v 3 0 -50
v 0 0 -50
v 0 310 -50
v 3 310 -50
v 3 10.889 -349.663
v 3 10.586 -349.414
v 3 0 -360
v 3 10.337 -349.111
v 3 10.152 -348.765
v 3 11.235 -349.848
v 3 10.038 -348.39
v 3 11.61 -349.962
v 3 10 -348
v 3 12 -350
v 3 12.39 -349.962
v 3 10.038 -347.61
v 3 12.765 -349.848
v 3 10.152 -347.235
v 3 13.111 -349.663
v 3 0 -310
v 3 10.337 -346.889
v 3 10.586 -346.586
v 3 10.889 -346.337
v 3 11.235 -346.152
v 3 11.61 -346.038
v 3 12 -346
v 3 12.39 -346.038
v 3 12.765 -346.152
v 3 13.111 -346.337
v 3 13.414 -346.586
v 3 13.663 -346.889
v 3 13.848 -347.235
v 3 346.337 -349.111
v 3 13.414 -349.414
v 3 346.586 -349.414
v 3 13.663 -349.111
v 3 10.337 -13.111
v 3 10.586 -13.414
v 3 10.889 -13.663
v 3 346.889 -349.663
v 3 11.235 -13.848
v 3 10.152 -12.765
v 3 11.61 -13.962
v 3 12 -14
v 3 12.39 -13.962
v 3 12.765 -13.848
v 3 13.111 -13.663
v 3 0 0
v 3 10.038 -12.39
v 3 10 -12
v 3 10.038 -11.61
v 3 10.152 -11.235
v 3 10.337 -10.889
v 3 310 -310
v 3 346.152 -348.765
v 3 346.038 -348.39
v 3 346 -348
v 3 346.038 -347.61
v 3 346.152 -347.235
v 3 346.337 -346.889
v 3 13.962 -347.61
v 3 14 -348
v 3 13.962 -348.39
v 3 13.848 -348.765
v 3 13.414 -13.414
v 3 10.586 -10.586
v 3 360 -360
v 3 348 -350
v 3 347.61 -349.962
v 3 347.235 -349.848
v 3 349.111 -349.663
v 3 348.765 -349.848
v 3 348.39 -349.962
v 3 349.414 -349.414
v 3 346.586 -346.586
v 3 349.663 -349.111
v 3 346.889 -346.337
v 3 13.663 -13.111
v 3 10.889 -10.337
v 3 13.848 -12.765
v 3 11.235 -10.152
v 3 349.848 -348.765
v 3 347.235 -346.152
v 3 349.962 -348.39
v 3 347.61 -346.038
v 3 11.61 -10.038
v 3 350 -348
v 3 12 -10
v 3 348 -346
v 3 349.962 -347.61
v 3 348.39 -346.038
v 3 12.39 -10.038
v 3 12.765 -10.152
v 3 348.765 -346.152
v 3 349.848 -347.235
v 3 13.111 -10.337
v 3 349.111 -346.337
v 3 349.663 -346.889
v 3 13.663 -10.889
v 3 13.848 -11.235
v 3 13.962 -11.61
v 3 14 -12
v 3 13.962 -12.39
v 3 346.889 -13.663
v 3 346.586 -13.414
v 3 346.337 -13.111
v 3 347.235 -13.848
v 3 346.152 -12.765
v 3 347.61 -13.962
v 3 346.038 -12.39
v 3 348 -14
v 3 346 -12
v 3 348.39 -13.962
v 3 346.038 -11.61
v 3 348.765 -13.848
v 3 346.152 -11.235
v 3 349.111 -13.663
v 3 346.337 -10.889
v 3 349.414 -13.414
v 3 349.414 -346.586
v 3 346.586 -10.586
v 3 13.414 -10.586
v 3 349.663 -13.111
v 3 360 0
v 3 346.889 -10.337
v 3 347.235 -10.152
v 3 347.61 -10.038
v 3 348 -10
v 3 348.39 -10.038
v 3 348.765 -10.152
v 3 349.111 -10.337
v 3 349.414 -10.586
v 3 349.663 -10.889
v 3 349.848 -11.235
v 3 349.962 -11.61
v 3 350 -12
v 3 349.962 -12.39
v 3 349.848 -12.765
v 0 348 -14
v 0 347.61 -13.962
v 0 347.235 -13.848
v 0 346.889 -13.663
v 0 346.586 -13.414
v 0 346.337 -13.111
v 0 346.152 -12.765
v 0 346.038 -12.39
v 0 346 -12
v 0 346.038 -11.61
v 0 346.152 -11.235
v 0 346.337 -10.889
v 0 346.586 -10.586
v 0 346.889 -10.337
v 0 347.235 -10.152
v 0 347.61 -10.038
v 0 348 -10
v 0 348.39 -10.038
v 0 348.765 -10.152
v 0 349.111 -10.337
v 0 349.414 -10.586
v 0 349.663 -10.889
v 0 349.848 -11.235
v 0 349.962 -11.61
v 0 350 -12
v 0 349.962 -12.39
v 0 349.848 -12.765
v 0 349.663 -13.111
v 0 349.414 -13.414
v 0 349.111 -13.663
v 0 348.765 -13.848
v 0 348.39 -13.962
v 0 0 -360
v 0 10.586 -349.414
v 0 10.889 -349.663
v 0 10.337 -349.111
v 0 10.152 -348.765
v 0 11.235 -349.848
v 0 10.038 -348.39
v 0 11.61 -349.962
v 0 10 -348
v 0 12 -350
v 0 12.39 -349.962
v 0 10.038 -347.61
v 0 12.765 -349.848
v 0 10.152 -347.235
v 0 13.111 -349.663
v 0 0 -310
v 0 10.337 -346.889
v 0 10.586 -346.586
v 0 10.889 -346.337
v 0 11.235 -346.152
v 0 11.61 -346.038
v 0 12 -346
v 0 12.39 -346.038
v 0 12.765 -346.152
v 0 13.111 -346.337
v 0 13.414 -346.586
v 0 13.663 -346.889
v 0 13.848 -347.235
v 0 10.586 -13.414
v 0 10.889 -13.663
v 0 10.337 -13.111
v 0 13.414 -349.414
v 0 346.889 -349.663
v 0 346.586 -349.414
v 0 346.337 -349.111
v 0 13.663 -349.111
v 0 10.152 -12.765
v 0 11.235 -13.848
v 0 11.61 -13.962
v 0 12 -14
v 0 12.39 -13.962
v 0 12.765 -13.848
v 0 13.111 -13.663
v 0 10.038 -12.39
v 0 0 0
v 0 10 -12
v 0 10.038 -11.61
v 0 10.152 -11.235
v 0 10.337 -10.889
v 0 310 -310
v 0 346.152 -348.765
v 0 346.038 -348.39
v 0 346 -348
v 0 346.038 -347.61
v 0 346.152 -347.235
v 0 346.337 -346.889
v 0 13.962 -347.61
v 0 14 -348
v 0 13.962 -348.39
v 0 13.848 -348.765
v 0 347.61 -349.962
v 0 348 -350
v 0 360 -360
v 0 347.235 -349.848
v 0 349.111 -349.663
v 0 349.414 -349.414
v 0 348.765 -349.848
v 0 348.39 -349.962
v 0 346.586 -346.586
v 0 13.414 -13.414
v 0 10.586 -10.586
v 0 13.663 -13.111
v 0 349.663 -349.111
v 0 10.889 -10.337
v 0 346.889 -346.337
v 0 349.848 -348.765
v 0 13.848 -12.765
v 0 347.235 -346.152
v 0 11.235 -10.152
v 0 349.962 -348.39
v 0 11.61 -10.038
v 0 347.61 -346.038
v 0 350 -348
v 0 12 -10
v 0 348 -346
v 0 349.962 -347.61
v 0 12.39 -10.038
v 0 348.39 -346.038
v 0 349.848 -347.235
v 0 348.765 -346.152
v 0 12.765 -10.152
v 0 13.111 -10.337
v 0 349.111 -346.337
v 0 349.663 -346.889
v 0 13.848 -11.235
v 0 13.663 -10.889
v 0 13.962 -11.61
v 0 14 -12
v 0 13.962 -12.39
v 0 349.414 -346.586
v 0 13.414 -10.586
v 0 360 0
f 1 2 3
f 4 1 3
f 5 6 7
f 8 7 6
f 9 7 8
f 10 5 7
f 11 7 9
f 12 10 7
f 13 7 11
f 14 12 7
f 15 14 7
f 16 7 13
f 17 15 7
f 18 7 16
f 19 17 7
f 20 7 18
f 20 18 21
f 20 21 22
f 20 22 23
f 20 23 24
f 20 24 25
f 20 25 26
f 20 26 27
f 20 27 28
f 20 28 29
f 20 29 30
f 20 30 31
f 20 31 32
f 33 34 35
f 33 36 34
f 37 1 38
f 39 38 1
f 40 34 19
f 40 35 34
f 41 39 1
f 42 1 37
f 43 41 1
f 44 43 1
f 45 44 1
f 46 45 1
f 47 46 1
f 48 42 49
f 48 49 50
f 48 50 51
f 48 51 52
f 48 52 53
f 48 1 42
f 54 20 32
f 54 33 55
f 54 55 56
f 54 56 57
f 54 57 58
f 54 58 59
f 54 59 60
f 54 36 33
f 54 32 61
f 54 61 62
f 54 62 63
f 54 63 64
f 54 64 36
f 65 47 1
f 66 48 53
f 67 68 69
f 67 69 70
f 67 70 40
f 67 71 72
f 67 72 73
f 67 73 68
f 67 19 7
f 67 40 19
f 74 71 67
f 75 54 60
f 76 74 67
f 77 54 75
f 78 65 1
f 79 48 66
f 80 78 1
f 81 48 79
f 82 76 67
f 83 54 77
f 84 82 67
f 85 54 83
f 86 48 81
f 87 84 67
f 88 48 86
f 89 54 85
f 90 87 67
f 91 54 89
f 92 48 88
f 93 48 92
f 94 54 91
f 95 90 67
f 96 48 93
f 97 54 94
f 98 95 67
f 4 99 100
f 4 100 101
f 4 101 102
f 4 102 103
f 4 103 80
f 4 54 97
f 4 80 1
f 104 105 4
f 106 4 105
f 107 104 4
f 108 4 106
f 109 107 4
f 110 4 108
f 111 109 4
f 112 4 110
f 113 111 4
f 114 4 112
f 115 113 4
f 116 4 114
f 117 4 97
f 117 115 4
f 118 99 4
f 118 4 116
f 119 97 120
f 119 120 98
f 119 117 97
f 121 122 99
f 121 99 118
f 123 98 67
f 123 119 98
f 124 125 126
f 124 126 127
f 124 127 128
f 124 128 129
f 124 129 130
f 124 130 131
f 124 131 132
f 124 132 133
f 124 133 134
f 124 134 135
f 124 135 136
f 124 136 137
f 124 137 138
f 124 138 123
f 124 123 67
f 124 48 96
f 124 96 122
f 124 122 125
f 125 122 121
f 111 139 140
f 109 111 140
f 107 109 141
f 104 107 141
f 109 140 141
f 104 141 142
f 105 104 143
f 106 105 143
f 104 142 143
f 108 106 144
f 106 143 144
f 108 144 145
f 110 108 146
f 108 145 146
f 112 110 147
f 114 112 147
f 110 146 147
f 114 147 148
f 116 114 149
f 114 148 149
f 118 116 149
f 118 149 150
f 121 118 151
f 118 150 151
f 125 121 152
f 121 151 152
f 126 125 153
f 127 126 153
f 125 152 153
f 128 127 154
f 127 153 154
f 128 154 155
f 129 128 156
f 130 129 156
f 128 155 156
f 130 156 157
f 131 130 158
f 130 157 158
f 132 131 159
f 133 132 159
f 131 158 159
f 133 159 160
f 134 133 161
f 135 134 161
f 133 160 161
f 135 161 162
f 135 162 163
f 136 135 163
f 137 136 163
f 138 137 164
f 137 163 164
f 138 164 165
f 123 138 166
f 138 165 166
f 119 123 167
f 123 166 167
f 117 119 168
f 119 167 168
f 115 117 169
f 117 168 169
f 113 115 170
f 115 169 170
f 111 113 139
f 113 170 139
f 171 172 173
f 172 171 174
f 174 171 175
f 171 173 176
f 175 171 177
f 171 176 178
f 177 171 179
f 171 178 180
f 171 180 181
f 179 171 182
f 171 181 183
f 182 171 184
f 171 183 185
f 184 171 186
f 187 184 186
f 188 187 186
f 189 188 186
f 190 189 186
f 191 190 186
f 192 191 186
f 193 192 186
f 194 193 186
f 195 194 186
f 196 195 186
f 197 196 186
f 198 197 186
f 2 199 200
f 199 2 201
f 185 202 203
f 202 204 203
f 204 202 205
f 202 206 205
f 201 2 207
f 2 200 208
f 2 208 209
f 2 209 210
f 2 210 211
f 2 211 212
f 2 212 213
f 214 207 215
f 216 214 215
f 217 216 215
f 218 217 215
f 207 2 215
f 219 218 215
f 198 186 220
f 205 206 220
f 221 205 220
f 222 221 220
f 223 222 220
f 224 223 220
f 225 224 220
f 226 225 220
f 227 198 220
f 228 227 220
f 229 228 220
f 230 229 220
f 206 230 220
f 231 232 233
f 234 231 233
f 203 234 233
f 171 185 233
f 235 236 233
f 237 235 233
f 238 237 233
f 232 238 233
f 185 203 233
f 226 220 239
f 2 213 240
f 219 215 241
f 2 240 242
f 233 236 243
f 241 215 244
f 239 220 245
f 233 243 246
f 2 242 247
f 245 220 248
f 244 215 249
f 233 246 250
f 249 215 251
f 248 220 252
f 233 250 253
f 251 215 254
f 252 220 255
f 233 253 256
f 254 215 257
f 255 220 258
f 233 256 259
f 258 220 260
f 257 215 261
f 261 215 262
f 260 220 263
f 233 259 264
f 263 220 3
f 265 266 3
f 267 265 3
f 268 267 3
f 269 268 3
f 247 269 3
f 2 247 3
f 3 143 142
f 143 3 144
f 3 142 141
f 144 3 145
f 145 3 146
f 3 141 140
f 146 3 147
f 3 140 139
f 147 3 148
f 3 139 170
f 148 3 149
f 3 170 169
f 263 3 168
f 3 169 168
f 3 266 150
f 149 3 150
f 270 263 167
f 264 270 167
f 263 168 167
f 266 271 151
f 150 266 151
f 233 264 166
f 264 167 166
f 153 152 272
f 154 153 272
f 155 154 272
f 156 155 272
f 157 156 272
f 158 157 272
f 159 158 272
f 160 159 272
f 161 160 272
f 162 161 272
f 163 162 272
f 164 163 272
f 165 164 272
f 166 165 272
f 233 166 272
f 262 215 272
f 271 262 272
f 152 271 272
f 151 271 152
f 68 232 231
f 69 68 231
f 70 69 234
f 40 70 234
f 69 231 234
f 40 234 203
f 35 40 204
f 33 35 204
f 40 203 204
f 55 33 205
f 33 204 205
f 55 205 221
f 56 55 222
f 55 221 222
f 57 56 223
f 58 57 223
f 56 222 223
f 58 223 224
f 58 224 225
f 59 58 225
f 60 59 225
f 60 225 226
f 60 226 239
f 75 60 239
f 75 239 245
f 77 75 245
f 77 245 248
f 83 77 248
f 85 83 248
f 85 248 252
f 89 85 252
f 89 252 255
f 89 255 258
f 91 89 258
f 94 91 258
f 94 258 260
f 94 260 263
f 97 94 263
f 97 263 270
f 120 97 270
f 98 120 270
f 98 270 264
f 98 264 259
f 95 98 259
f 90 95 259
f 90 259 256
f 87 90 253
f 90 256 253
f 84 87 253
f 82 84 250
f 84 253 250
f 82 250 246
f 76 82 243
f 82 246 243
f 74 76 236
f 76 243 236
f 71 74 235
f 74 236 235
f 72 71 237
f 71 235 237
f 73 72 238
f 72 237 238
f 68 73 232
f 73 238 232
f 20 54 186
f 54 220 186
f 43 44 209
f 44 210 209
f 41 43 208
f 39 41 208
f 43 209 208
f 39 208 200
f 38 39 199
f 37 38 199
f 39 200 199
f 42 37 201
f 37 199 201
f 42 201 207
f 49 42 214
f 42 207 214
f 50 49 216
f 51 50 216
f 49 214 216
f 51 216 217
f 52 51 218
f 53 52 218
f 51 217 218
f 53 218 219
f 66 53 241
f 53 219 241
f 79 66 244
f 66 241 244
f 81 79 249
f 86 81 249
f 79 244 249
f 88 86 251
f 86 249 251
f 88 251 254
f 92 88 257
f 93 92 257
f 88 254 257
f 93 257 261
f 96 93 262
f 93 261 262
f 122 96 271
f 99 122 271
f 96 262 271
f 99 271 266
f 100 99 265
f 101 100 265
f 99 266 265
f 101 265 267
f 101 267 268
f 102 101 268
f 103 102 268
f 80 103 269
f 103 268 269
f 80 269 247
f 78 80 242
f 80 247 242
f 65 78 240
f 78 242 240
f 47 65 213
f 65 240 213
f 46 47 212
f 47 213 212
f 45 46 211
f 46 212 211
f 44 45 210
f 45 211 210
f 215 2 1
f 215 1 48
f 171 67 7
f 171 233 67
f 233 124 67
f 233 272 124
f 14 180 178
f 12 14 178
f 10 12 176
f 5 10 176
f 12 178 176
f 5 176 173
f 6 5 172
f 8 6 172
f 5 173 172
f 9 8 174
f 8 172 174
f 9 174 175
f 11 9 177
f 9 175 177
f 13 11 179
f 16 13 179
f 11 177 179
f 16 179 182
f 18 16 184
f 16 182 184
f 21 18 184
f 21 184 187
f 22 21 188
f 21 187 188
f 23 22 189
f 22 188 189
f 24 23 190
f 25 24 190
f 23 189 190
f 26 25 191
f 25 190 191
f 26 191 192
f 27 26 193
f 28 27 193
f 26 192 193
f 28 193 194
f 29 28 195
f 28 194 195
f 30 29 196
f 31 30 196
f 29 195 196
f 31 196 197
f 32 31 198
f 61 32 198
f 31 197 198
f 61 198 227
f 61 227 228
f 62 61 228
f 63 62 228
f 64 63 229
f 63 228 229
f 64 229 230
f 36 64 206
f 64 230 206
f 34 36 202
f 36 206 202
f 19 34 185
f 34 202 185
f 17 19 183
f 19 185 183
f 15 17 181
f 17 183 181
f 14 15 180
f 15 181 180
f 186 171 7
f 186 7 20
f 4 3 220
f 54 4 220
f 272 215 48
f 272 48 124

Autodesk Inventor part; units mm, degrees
ref_plane "YZ Plane" through (0, 0, 0) normal (1, 0, 0) x (0, 1, 0)
ref_plane "XZ Plane" through (0, 0, 0) normal (0, 1, 0) x (-1, 0, 0)
ref_plane "XY Plane" through (0, 0, 0) normal (0, 0, 1) x (1, 0, 0)
sketch "Sketch1" plane through (0, 0, 0) normal (1, 0, 0) x (0, 1, 0)
  line L0 (0, 0) -> (360, 0)
  line L1 (360, 0) -> (360, -360)
  line L2 (360, -360) -> (0, -360)
  line L3 (0, -360) -> (0, -310)
  line L4 (0, -50) -> (310, -50)
  line L5 (310, -50) -> (310, -310)
  line L6 (310, -310) -> (0, -310)
  line L7 (0, -310) -> (0, -50)
  line L8 (0, -50) -> (0, 0)
  line L9 (0, -310) -> (0, -50)
  dimension "d4" = 360
  dimension "d5" = 360
  dimension "d6" = 310
  dimension "d7" = 260
extrude "Extrusion1" add sketch "Sketch1" along normal blind 3 contours L0 L1 L2 L3 L6 L5 L4 L8
hole "Hole1" at (3, 348, -12) direction (-1, 0, 0) diameter 4 end through all
hole "Hole2" at (3, 348, -348) direction (-1, 0, 0) diameter 4 end through all
hole "Hole3" at (3, 12, -348) direction (-1, 0, 0) diameter 4 end through all
hole "Hole4" at (3, 12, -12) direction (-1, 0, 0) diameter 4 end through all
properties part number "FrameCentre" material "Dibond Yellow"
